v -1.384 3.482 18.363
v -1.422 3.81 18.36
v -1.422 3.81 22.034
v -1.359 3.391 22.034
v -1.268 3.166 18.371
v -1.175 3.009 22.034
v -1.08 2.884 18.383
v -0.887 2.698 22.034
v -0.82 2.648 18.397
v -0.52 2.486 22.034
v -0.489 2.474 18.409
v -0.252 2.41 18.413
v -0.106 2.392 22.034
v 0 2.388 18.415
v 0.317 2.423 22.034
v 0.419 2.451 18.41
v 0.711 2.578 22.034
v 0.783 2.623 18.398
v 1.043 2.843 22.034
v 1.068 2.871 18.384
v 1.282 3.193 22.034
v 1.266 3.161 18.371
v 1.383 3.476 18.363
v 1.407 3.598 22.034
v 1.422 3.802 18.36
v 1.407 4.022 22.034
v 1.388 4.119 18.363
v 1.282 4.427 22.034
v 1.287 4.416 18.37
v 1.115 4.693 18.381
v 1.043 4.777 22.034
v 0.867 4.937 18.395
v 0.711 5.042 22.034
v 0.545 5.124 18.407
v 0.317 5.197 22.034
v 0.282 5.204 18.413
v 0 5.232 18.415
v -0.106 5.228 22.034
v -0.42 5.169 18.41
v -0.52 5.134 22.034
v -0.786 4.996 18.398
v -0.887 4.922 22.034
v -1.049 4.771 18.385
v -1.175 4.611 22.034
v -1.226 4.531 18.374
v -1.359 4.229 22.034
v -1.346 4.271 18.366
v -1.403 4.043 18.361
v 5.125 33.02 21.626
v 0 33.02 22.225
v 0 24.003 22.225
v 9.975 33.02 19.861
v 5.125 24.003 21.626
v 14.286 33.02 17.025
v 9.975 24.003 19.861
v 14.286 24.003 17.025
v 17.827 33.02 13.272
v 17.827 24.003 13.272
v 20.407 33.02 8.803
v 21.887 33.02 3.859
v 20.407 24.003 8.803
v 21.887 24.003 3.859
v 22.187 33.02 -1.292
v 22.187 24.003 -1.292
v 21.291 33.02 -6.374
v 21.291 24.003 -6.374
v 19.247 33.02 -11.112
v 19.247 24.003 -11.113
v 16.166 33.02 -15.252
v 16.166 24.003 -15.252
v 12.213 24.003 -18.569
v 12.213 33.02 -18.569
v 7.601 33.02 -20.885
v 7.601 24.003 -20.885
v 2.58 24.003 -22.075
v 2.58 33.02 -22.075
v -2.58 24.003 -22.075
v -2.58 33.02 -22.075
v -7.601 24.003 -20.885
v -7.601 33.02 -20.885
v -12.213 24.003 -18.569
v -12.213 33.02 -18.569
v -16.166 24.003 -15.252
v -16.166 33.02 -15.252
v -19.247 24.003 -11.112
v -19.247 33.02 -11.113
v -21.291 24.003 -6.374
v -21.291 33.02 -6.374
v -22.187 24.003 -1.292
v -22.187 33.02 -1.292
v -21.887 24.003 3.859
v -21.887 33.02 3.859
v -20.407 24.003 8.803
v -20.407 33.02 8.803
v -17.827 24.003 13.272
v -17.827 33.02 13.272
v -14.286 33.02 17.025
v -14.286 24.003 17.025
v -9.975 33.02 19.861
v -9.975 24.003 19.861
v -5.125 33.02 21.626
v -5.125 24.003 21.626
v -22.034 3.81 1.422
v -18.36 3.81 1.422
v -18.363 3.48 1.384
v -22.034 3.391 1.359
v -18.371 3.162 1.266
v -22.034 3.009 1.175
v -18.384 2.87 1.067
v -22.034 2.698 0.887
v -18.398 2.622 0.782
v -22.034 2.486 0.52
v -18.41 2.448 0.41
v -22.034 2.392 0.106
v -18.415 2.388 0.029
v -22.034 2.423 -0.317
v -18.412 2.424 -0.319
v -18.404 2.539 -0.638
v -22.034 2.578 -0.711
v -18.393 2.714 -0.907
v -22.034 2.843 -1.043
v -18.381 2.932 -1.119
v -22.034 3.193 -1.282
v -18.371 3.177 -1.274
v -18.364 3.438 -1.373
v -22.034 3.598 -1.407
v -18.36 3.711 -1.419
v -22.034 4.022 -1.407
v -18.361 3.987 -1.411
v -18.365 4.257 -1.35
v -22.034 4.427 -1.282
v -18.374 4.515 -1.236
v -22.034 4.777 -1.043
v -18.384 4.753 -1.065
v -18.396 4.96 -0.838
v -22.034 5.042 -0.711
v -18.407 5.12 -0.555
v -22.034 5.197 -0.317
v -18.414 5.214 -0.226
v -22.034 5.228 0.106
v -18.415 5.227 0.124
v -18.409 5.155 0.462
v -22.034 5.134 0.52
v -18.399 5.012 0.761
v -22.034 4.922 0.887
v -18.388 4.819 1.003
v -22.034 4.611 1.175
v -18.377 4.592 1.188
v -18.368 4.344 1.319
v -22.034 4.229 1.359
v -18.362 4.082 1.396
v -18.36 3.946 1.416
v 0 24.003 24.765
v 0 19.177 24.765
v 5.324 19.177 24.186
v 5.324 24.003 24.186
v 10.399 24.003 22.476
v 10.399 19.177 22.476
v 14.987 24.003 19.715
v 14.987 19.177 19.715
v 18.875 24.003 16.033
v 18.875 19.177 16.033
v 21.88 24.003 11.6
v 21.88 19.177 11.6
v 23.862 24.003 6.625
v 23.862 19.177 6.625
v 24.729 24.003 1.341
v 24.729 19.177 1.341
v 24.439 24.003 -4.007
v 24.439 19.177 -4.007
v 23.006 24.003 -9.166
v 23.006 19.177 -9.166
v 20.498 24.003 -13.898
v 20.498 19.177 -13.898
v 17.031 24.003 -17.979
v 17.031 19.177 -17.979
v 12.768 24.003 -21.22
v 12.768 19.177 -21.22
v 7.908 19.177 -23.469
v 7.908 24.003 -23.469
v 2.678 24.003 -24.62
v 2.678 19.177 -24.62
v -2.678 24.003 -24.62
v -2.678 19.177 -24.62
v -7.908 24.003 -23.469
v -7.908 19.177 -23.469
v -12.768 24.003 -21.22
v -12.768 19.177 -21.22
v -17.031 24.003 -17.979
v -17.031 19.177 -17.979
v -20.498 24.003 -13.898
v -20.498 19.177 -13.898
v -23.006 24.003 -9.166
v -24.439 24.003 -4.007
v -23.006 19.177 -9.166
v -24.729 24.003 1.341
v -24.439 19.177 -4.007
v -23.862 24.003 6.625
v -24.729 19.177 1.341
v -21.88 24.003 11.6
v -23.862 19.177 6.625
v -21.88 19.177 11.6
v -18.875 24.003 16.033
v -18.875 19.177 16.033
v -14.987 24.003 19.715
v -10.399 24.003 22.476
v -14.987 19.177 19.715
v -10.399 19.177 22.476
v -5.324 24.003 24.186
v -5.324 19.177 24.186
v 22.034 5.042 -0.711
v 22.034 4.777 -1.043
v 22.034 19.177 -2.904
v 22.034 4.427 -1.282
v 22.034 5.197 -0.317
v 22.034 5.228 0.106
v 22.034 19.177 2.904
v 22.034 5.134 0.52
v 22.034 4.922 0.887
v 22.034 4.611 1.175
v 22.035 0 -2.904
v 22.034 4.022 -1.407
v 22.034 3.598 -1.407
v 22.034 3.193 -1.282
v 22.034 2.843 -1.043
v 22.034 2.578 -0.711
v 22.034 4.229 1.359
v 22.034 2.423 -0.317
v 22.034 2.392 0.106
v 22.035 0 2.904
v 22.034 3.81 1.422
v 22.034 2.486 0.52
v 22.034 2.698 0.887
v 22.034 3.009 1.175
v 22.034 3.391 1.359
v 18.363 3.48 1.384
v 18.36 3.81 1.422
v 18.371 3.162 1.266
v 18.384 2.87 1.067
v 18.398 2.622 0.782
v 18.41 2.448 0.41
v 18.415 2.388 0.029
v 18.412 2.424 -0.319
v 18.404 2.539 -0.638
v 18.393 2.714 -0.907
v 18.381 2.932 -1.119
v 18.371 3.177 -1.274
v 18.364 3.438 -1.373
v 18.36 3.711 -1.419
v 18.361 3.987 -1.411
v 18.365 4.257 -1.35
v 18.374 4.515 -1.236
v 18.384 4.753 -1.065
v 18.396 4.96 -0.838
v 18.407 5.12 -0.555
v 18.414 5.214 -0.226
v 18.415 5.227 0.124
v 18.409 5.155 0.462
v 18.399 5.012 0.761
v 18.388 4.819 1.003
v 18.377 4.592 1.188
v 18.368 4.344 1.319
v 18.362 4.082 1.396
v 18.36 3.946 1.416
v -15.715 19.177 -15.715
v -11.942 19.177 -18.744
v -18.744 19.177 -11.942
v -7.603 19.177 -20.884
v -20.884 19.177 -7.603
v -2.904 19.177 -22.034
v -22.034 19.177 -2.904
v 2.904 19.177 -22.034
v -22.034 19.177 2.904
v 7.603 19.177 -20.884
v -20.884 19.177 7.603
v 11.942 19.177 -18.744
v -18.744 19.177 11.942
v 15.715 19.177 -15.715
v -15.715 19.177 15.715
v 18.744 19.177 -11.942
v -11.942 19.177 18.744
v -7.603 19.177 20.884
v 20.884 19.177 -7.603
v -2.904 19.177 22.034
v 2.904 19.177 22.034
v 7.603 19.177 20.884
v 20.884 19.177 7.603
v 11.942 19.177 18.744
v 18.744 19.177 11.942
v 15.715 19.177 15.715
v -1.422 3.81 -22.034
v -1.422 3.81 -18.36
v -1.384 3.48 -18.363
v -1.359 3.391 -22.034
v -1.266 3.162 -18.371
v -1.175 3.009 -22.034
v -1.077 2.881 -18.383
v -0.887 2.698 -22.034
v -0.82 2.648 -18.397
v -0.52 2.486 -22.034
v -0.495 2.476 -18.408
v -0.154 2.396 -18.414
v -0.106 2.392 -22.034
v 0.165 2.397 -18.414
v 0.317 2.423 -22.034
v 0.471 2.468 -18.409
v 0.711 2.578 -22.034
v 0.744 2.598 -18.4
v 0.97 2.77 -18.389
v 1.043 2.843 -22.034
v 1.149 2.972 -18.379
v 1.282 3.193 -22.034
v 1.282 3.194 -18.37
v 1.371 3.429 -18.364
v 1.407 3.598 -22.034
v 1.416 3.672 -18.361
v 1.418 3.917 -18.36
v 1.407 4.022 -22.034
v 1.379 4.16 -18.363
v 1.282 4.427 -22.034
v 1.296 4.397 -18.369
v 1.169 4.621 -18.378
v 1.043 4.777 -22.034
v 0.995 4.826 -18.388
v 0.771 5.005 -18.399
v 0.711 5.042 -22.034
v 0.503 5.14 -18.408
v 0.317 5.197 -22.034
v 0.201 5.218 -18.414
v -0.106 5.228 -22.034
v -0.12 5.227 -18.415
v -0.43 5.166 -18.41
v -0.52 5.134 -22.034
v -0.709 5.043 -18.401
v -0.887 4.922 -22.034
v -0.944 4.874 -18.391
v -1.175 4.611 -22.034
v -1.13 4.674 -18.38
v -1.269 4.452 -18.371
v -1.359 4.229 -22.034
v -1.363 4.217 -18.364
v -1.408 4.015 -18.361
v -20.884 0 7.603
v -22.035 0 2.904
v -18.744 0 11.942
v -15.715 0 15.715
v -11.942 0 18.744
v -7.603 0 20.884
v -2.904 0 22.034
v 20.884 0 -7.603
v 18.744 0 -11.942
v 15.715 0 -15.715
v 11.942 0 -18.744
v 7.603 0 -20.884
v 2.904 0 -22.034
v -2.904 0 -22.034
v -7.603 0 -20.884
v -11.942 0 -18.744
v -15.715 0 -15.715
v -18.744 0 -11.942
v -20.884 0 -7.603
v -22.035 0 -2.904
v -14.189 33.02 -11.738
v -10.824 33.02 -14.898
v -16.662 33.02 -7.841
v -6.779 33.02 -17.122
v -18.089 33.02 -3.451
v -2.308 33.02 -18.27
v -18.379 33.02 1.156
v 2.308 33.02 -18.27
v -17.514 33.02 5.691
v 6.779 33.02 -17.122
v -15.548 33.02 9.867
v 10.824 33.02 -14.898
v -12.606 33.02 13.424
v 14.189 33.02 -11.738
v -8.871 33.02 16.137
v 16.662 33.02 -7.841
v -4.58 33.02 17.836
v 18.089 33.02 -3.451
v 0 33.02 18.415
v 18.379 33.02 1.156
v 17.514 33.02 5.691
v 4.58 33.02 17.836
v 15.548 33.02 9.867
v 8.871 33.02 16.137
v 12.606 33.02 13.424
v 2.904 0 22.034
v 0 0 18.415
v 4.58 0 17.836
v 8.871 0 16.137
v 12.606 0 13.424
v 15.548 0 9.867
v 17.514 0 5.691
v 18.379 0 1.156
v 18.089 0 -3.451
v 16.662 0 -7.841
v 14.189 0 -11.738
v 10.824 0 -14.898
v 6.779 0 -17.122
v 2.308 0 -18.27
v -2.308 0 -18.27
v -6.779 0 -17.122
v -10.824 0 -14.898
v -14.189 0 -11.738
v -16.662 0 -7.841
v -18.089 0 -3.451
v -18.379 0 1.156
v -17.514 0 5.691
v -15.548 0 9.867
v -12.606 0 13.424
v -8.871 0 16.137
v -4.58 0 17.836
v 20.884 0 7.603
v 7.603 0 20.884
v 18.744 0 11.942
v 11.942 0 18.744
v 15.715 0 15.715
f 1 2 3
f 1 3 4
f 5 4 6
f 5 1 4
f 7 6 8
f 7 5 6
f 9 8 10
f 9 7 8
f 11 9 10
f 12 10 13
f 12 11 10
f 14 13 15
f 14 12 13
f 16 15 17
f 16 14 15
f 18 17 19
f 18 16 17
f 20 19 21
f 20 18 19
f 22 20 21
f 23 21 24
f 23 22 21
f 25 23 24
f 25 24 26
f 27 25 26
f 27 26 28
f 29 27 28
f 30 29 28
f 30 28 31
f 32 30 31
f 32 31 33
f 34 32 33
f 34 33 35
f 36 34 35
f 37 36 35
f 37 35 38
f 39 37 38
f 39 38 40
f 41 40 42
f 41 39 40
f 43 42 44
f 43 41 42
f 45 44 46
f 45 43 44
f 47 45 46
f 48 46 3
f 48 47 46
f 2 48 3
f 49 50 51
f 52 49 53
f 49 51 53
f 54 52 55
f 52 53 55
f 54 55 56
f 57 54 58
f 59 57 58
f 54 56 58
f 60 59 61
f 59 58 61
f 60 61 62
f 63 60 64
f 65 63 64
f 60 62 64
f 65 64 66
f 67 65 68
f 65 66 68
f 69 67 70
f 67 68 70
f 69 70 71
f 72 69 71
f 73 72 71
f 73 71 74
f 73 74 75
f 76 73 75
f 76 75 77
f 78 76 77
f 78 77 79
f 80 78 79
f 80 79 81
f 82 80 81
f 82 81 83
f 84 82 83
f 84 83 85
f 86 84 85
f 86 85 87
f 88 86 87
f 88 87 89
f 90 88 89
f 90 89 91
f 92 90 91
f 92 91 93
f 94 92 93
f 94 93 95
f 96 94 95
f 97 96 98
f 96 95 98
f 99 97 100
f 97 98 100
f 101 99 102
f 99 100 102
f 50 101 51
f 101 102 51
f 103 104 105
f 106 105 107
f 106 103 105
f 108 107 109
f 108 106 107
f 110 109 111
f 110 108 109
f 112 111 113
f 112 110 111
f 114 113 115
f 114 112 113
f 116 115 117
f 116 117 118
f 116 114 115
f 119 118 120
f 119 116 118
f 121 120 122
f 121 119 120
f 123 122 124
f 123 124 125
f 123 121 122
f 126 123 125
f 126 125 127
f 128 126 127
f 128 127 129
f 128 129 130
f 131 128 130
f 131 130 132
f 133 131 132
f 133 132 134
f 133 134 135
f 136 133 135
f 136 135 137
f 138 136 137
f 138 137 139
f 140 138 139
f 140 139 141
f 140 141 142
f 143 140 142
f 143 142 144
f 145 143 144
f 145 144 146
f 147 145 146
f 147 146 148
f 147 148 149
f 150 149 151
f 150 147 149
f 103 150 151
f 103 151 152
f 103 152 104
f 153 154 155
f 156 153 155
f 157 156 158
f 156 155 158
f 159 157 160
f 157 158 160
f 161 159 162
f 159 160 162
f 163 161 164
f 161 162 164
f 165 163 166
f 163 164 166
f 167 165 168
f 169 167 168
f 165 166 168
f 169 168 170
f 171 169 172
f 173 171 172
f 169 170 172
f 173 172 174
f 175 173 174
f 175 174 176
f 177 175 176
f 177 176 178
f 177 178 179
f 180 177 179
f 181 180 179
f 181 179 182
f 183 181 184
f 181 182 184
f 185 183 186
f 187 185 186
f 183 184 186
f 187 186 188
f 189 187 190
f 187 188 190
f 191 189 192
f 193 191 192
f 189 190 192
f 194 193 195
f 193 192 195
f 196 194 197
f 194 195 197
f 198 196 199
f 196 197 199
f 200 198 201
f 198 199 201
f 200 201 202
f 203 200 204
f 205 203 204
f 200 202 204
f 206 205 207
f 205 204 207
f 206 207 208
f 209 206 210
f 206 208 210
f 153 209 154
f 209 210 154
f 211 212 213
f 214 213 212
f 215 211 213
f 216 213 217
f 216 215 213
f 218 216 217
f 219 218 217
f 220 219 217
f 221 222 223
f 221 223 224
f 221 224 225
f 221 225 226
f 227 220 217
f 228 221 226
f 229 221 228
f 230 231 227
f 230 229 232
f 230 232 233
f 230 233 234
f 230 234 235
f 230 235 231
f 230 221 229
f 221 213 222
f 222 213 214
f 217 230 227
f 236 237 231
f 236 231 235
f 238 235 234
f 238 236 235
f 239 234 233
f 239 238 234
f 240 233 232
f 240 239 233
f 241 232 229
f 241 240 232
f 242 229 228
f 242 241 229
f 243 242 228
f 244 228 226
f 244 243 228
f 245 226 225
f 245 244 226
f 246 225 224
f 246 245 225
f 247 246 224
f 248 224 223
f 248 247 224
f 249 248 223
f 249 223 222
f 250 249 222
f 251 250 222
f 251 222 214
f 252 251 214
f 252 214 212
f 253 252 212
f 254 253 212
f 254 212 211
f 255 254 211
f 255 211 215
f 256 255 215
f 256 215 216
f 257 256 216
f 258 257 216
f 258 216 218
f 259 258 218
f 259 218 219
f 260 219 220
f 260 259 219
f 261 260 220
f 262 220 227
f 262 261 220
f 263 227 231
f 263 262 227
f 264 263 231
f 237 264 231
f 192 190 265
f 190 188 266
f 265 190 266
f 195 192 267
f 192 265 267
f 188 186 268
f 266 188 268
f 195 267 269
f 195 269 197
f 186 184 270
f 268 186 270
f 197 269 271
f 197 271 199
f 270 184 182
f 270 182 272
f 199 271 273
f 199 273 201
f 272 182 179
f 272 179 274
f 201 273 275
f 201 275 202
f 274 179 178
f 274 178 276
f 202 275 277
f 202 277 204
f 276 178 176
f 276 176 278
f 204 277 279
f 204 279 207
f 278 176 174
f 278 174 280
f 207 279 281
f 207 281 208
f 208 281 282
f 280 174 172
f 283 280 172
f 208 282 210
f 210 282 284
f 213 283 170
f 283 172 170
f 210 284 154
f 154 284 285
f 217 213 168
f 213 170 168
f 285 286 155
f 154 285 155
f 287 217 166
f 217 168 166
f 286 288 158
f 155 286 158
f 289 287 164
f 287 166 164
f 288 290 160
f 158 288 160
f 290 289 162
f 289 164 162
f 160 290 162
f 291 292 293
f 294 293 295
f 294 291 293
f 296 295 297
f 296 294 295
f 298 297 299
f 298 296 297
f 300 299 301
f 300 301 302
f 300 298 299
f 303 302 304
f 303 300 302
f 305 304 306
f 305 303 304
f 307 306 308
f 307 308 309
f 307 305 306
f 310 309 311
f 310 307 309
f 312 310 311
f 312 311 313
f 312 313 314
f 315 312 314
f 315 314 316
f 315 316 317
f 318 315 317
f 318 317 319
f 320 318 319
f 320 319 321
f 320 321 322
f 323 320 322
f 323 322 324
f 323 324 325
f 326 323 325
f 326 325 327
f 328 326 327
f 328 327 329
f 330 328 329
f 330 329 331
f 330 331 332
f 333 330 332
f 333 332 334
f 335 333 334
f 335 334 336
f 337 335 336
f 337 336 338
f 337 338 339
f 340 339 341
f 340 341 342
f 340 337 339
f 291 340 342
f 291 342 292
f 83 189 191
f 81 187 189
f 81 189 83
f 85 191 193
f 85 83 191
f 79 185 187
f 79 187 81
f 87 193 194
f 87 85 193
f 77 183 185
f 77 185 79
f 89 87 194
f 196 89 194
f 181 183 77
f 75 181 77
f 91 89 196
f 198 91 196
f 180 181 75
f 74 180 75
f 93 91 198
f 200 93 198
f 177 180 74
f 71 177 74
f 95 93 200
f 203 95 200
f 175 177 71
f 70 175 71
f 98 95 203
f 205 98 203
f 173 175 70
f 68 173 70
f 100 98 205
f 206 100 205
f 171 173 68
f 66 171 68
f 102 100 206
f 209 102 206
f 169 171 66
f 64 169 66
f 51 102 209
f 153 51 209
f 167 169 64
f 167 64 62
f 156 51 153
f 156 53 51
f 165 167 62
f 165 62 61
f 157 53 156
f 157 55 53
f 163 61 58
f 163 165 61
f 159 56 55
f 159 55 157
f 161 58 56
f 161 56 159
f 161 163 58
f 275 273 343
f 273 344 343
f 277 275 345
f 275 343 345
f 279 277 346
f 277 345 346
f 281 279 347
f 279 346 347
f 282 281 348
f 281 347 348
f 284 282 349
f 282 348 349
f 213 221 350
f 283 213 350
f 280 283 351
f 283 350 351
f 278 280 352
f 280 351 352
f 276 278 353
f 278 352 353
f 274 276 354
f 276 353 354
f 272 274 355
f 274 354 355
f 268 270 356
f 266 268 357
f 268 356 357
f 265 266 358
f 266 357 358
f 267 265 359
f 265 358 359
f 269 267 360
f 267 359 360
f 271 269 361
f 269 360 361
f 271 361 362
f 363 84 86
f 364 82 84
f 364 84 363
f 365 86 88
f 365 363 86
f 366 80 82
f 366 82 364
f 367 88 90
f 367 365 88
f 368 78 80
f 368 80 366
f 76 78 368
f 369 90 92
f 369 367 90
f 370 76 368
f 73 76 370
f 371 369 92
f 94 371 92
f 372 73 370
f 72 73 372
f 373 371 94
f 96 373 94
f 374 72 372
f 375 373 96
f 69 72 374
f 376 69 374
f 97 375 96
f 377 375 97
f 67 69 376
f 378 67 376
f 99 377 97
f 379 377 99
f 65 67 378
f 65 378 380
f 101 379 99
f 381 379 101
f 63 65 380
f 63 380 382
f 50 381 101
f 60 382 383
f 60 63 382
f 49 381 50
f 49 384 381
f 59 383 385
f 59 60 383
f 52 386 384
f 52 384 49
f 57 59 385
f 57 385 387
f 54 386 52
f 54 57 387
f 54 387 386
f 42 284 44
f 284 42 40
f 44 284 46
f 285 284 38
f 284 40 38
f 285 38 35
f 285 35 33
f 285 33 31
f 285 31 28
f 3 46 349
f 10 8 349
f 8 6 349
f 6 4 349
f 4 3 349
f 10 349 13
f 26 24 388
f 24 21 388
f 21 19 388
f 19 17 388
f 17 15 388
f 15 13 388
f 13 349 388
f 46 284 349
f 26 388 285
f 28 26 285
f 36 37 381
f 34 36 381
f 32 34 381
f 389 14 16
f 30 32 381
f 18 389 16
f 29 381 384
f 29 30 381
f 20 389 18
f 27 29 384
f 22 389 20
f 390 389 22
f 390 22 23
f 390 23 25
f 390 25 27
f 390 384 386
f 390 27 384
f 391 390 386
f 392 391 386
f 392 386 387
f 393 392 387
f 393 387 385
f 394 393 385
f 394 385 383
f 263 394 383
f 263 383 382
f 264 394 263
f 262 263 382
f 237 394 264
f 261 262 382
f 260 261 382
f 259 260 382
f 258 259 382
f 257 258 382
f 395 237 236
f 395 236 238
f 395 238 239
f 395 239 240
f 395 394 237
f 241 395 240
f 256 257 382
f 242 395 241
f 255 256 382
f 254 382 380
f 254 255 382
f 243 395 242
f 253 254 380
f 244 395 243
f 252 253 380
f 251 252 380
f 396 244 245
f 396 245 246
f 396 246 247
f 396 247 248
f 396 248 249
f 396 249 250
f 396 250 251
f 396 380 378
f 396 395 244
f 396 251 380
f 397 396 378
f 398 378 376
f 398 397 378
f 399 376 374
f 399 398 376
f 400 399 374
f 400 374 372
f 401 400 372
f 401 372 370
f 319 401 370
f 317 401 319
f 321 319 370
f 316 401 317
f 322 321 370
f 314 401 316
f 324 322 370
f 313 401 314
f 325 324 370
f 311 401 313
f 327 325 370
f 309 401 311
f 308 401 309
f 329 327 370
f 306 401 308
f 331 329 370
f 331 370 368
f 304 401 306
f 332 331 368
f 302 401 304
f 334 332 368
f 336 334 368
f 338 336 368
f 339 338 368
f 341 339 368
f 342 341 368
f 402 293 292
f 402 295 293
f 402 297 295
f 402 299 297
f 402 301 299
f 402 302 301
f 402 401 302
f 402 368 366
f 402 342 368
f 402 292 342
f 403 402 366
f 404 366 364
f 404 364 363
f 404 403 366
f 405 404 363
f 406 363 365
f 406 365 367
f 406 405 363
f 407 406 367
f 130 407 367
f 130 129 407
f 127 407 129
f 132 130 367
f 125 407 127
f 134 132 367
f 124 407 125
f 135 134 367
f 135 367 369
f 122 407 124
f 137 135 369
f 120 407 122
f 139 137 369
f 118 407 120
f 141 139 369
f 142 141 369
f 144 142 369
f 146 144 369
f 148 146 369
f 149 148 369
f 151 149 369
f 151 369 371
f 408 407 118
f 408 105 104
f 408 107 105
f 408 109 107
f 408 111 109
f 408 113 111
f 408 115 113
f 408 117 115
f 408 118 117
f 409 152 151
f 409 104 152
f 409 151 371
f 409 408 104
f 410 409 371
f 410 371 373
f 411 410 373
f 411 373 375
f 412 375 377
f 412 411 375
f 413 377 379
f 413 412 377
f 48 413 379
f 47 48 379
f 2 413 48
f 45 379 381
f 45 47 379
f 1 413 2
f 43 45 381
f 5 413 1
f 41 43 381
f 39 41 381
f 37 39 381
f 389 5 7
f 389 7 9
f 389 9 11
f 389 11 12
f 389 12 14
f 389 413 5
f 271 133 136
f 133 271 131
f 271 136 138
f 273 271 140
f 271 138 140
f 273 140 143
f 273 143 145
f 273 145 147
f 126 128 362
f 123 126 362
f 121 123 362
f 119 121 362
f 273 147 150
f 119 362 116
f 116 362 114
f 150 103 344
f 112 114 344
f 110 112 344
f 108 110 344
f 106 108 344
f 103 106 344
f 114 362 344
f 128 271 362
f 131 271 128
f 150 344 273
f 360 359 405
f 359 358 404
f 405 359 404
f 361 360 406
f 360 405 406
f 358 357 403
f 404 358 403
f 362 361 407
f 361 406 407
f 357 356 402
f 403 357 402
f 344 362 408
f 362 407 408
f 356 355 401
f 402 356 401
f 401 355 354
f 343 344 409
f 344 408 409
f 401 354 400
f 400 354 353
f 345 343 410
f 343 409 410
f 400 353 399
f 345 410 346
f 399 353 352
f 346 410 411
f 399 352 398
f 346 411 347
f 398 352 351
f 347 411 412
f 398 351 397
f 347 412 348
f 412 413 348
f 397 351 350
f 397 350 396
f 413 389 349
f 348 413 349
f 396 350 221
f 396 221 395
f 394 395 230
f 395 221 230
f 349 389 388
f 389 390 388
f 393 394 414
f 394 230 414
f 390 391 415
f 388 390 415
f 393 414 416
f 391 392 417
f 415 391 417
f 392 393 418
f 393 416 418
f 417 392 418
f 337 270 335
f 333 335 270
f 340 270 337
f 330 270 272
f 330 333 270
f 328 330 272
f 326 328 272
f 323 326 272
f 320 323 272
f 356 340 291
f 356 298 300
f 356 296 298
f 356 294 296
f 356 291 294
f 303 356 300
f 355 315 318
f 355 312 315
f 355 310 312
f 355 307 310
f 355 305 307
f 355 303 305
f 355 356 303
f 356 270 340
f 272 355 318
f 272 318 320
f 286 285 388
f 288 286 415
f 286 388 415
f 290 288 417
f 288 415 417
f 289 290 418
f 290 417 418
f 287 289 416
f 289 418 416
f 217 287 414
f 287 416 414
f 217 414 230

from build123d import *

# Parameters (mm, degrees)
SKETCH1_R               = 22.225
SKETCH1_R_2             = 18.415
BOSS_EXTRUDE1_DEPTH     = 33.02
CUT_EXTRUDE1_DEPTH      = 43.18
CUT_EXTRUDE1_DEPTH_BACK = 43.18
SKETCH2_R               = 1.4224
CUT_EXTRUDE2_DEPTH      = 43.18
CUT_EXTRUDE2_DEPTH_BACK = 43.18
SKETCH3_R               = 1.4224
SKETCH4_W               = 49.025527768
SKETCH4_H               = 48.000320082
SKETCH4_W_2             = 44.069
SKETCH4_H_2             = 44.069
CUT_EXTRUDE3_DEPTH      = 19.177
BOSS_EXTRUDE2_START     = -4.826
SKETCH5_R               = 24.765
SKETCH5_R_2             = 18.415
BOSS_EXTRUDE2_DEPTH     = 4.826


with BuildPart() as part:
    # Sketch1 → Boss-Extrude1 (new body)
    with BuildSketch(Plane(origin=(0, 0, 0), x_dir=(1, 0, 0), z_dir=(0, 1, 0))):
        Circle(SKETCH1_R)
        Circle(SKETCH1_R_2, mode=Mode.SUBTRACT)
    extrude(amount=BOSS_EXTRUDE1_DEPTH)

    # Sketch2 → Cut-Extrude1 (cut, two sides: drawn at the far end of the back side and taken through both)
    with BuildSketch(Plane.XY.offset(-CUT_EXTRUDE1_DEPTH_BACK)):
        with Locations((0, 3.81)):
            Circle(SKETCH2_R)
    extrude(amount=CUT_EXTRUDE1_DEPTH + CUT_EXTRUDE1_DEPTH_BACK, mode=Mode.SUBTRACT)

    # Sketch3 → Cut-Extrude2 (cut, two sides: drawn at the far end of the back side and taken through both)
    with BuildSketch(Plane(origin=(0, 0, 0), x_dir=(0, 0, -1), z_dir=(1, 0, 0)).offset(-CUT_EXTRUDE2_DEPTH_BACK)):
        with Locations((0, 3.81)):
            Circle(SKETCH3_R)
    extrude(amount=CUT_EXTRUDE2_DEPTH + CUT_EXTRUDE2_DEPTH_BACK, mode=Mode.SUBTRACT)

    # Sketch4 → Cut-Extrude3 (cut)
    with BuildSketch(Plane.XZ):
        Rectangle(SKETCH4_W, SKETCH4_H)
        Rectangle(SKETCH4_W_2, SKETCH4_H_2, mode=Mode.SUBTRACT)
    extrude(amount=-CUT_EXTRUDE3_DEPTH, mode=Mode.SUBTRACT)

    # Sketch5 → Boss-Extrude2 (add)
    with BuildSketch(Plane(origin=(0, 24.003, 0), x_dir=(1, 0, 0), z_dir=(0, 1, 0)).offset(BOSS_EXTRUDE2_START)):
        Circle(SKETCH5_R)
        Circle(SKETCH5_R_2, mode=Mode.SUBTRACT)
    extrude(amount=BOSS_EXTRUDE2_DEPTH)


solid = part.part
